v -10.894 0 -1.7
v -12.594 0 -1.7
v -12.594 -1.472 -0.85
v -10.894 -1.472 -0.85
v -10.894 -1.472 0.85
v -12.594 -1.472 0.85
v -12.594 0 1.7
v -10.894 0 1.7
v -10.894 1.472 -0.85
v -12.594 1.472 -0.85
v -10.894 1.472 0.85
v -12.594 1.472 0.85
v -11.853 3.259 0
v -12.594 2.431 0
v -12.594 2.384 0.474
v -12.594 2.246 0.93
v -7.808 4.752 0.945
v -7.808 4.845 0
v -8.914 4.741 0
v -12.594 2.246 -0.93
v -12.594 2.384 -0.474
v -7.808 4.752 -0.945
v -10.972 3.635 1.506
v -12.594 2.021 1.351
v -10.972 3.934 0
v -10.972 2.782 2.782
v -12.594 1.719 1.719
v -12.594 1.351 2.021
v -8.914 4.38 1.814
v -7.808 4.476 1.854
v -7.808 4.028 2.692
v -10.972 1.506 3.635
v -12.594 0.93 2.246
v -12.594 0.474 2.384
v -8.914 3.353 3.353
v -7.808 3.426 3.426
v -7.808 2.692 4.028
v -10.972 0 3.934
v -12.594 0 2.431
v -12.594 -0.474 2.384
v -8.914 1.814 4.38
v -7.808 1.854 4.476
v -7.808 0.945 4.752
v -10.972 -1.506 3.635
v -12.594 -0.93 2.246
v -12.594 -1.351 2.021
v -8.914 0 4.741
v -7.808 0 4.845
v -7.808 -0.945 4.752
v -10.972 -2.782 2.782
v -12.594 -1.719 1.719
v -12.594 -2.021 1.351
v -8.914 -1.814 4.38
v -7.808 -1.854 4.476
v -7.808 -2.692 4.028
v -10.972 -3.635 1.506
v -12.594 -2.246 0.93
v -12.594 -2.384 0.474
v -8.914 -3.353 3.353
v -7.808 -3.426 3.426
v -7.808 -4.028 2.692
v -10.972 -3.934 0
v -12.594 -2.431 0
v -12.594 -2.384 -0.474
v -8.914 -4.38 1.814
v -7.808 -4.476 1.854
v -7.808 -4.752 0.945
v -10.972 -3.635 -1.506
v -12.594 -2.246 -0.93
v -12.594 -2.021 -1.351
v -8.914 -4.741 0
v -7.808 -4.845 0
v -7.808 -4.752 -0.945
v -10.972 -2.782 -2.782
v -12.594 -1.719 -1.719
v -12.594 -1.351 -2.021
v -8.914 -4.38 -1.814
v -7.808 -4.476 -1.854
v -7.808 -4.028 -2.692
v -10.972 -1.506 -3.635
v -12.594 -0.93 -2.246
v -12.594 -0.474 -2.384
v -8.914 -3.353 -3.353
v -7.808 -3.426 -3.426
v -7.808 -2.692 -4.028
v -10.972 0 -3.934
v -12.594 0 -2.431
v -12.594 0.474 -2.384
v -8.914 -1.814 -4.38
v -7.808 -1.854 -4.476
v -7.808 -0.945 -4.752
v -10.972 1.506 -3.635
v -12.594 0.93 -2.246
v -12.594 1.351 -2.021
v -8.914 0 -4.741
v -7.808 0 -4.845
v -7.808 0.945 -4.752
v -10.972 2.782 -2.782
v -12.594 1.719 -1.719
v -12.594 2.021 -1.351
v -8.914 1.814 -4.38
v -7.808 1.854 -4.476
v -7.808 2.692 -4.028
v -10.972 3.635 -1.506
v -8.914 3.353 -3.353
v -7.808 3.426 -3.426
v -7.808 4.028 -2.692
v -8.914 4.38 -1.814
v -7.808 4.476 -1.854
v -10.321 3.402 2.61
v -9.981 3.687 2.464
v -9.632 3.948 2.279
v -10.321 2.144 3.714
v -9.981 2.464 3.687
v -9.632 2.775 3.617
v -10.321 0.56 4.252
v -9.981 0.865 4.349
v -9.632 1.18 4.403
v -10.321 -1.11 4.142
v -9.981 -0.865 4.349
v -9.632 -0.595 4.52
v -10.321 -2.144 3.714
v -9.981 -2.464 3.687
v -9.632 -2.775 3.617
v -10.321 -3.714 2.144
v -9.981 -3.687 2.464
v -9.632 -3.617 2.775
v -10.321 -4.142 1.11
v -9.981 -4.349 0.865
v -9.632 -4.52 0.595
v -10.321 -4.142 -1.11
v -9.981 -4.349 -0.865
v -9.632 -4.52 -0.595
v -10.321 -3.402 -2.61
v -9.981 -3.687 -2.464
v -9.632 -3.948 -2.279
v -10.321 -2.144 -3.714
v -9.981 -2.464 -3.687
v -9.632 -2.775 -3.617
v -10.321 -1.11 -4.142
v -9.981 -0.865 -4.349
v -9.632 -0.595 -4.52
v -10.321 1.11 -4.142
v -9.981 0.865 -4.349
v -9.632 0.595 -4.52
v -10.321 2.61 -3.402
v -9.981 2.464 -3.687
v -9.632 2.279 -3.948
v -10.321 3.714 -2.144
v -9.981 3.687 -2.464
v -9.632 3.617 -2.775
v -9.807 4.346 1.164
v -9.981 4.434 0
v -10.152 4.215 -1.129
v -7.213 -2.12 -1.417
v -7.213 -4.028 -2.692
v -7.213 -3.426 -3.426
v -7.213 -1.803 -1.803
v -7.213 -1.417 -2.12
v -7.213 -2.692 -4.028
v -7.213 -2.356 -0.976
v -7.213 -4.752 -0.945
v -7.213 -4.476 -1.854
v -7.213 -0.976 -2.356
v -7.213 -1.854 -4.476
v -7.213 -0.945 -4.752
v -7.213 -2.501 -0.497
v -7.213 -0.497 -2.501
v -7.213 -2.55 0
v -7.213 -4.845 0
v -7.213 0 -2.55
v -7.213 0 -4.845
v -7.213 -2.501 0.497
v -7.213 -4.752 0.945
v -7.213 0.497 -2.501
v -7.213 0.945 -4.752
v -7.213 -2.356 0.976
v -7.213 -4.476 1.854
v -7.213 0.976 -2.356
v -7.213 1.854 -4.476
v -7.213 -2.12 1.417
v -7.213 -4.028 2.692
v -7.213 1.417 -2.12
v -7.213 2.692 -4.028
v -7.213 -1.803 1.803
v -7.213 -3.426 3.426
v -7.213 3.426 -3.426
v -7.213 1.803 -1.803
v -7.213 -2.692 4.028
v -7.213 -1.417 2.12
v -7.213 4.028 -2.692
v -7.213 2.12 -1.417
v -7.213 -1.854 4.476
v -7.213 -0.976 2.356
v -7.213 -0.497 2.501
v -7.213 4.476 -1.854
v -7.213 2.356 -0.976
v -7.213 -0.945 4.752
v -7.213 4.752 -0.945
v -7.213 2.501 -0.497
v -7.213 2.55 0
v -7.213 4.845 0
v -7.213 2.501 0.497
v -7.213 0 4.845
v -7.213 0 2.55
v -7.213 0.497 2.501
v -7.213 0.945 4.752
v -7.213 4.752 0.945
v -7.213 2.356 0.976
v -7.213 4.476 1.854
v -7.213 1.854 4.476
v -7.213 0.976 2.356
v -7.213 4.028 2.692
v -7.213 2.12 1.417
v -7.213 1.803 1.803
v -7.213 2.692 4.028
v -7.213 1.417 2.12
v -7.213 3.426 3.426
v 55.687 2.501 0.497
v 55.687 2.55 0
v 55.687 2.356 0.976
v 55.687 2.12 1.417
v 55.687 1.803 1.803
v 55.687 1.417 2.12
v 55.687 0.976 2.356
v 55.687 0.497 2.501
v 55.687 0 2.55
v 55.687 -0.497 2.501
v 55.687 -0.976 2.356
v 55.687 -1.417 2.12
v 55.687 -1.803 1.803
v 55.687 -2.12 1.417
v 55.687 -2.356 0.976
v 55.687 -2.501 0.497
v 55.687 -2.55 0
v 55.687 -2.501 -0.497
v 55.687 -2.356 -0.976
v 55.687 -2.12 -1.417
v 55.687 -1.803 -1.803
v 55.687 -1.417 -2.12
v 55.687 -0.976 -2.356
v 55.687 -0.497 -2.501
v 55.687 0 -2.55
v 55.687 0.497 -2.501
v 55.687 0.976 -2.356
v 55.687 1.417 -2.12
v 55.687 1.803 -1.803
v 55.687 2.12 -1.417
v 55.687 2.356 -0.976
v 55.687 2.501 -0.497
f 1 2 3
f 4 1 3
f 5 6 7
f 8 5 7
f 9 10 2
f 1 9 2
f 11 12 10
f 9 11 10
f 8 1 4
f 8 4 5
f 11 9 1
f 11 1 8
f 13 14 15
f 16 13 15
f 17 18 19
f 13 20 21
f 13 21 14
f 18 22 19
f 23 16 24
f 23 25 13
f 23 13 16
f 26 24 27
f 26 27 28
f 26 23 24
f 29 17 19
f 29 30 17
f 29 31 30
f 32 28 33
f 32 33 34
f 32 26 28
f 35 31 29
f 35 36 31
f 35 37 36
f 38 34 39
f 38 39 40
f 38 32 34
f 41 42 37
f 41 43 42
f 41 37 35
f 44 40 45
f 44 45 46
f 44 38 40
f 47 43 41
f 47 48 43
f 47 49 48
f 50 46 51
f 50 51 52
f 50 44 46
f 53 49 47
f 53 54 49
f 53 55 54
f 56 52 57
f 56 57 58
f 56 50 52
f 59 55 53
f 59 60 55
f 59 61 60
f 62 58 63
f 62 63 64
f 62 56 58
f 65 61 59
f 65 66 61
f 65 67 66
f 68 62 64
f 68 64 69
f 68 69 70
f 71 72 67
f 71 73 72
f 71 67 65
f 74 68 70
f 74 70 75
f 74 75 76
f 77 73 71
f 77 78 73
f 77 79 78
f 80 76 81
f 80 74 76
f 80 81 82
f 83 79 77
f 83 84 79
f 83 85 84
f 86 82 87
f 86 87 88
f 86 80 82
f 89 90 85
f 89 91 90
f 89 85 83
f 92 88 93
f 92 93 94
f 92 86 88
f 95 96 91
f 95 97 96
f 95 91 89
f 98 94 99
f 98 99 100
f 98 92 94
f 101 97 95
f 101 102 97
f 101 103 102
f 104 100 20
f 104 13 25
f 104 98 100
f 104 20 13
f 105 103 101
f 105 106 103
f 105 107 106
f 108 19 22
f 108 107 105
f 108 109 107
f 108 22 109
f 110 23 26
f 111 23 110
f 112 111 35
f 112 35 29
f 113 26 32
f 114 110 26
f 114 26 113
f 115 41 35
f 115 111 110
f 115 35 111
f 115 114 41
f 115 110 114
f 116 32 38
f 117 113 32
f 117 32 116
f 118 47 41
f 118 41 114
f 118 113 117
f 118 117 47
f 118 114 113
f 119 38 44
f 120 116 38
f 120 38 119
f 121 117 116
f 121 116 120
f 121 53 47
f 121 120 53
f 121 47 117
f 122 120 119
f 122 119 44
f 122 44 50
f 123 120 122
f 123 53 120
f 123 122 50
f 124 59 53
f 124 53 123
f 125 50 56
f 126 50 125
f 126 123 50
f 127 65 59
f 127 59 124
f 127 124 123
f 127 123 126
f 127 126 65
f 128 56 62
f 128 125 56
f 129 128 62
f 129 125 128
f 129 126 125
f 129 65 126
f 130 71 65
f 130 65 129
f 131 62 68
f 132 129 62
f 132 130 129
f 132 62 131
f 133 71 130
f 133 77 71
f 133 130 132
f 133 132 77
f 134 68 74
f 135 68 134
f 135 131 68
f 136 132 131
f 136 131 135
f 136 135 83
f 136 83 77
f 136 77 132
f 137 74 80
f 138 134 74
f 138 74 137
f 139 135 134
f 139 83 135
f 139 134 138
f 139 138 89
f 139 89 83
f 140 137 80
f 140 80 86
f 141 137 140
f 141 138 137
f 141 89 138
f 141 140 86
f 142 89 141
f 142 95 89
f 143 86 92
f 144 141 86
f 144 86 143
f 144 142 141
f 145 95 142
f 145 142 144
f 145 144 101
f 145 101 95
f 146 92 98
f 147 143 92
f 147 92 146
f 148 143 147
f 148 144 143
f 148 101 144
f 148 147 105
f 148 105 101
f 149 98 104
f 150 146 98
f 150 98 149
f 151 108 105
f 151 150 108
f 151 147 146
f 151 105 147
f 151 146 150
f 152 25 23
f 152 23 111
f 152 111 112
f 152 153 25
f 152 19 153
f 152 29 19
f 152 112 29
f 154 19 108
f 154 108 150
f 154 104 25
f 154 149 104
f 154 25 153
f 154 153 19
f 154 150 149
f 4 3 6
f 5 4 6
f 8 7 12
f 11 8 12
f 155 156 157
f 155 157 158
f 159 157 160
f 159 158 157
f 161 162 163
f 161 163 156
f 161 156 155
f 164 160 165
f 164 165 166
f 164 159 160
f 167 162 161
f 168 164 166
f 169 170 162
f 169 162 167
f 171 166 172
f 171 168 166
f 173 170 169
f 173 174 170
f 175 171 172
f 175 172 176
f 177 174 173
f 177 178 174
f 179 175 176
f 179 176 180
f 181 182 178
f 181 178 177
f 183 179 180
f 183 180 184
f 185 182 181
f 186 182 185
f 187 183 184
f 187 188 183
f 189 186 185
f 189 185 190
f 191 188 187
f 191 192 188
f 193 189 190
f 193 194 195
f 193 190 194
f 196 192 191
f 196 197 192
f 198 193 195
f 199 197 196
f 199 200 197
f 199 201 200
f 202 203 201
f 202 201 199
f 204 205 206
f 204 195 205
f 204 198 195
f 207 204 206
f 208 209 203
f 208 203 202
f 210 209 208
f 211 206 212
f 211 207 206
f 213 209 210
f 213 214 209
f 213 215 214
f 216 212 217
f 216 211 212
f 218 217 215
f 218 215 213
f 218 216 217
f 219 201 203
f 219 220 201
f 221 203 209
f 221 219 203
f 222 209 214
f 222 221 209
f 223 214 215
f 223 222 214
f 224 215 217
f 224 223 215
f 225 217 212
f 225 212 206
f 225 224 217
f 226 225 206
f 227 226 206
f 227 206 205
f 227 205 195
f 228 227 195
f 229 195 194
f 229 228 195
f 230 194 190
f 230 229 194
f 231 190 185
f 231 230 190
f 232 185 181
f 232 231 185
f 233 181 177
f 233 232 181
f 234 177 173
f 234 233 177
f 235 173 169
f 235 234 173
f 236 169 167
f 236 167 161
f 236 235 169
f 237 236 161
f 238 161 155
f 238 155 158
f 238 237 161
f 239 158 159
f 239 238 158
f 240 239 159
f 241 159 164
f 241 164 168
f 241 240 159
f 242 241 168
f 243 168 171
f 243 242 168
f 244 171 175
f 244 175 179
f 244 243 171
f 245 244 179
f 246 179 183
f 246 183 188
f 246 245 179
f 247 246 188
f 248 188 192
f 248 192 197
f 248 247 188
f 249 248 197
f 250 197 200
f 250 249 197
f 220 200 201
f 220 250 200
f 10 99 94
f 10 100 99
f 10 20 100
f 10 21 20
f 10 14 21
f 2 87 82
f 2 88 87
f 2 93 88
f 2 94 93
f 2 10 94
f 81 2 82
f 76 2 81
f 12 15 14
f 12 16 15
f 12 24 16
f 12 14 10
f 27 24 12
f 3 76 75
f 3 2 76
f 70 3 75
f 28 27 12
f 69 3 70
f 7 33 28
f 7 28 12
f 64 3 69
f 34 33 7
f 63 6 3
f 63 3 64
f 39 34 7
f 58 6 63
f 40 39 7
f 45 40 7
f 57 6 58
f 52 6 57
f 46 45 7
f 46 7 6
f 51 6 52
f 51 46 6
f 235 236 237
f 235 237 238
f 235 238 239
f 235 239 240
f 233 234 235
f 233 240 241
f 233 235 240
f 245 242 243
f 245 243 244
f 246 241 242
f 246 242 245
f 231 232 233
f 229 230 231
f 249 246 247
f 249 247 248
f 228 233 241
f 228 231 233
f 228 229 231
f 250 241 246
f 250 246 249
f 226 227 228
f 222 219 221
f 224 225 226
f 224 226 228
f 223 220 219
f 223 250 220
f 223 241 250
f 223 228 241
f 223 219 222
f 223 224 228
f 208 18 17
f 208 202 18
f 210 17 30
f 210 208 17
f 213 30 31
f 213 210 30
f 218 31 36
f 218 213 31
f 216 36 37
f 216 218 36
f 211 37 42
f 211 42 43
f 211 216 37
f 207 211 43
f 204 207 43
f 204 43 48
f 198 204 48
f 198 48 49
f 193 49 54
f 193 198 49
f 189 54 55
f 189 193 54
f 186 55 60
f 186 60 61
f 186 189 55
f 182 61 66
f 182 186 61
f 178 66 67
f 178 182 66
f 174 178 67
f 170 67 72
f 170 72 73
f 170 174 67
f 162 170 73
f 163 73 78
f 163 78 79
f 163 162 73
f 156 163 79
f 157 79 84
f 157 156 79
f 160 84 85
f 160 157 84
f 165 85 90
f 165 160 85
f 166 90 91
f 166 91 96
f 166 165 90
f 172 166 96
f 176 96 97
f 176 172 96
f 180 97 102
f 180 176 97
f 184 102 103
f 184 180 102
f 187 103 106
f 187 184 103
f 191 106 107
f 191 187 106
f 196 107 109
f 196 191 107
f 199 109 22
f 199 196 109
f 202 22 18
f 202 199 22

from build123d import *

# Parameters (mm, degrees)
CUT_EXTRUDE1_DEPTH = 1
SCALE1_SCALE       = 1.7


with BuildPart() as part:
    # Sketch1 → Revolve1 (revolve)
    with BuildSketch(Plane.XY):
        with BuildLine():
            Line((0, 0), (0, 1.43))
            ThreePointArc((0, 1.43), (1.238500708, 2.474899998), (2.814888985, 2.85))
            Line((2.814888985, 2.85), (3.164888985, 2.85))
            Line((3.164888985, 2.85), (3.164888985, 1.5))
            Line((3.164888985, 1.5), (40.164888985, 1.5))
            Line((40.164888985, 1.5), (40.164888985, 0))
            Line((40.164888985, 0), (0, 0))
        make_face()
    revolve(axis=Axis((0, 0, 0), (1, 0, 0)))

    # Sketch2 → Cut-Extrude1 (cut)
    with BuildSketch(Plane.ZY):
        Polygon((1, 0), (0.5, 0.866025404), (-0.5, 0.866025404), (-1, 0), (-0.5, -0.866025404), (0.5, -0.866025404), align=None)
    extrude(amount=-CUT_EXTRUDE1_DEPTH, mode=Mode.SUBTRACT)


with BuildPart() as part_1:
    # Scale1: scaled about (17.990832775, 0, 0)
    add(part.part.scale(SCALE1_SCALE).moved(Location((-12.593582942, 0, 0))))


solid = part_1.part
